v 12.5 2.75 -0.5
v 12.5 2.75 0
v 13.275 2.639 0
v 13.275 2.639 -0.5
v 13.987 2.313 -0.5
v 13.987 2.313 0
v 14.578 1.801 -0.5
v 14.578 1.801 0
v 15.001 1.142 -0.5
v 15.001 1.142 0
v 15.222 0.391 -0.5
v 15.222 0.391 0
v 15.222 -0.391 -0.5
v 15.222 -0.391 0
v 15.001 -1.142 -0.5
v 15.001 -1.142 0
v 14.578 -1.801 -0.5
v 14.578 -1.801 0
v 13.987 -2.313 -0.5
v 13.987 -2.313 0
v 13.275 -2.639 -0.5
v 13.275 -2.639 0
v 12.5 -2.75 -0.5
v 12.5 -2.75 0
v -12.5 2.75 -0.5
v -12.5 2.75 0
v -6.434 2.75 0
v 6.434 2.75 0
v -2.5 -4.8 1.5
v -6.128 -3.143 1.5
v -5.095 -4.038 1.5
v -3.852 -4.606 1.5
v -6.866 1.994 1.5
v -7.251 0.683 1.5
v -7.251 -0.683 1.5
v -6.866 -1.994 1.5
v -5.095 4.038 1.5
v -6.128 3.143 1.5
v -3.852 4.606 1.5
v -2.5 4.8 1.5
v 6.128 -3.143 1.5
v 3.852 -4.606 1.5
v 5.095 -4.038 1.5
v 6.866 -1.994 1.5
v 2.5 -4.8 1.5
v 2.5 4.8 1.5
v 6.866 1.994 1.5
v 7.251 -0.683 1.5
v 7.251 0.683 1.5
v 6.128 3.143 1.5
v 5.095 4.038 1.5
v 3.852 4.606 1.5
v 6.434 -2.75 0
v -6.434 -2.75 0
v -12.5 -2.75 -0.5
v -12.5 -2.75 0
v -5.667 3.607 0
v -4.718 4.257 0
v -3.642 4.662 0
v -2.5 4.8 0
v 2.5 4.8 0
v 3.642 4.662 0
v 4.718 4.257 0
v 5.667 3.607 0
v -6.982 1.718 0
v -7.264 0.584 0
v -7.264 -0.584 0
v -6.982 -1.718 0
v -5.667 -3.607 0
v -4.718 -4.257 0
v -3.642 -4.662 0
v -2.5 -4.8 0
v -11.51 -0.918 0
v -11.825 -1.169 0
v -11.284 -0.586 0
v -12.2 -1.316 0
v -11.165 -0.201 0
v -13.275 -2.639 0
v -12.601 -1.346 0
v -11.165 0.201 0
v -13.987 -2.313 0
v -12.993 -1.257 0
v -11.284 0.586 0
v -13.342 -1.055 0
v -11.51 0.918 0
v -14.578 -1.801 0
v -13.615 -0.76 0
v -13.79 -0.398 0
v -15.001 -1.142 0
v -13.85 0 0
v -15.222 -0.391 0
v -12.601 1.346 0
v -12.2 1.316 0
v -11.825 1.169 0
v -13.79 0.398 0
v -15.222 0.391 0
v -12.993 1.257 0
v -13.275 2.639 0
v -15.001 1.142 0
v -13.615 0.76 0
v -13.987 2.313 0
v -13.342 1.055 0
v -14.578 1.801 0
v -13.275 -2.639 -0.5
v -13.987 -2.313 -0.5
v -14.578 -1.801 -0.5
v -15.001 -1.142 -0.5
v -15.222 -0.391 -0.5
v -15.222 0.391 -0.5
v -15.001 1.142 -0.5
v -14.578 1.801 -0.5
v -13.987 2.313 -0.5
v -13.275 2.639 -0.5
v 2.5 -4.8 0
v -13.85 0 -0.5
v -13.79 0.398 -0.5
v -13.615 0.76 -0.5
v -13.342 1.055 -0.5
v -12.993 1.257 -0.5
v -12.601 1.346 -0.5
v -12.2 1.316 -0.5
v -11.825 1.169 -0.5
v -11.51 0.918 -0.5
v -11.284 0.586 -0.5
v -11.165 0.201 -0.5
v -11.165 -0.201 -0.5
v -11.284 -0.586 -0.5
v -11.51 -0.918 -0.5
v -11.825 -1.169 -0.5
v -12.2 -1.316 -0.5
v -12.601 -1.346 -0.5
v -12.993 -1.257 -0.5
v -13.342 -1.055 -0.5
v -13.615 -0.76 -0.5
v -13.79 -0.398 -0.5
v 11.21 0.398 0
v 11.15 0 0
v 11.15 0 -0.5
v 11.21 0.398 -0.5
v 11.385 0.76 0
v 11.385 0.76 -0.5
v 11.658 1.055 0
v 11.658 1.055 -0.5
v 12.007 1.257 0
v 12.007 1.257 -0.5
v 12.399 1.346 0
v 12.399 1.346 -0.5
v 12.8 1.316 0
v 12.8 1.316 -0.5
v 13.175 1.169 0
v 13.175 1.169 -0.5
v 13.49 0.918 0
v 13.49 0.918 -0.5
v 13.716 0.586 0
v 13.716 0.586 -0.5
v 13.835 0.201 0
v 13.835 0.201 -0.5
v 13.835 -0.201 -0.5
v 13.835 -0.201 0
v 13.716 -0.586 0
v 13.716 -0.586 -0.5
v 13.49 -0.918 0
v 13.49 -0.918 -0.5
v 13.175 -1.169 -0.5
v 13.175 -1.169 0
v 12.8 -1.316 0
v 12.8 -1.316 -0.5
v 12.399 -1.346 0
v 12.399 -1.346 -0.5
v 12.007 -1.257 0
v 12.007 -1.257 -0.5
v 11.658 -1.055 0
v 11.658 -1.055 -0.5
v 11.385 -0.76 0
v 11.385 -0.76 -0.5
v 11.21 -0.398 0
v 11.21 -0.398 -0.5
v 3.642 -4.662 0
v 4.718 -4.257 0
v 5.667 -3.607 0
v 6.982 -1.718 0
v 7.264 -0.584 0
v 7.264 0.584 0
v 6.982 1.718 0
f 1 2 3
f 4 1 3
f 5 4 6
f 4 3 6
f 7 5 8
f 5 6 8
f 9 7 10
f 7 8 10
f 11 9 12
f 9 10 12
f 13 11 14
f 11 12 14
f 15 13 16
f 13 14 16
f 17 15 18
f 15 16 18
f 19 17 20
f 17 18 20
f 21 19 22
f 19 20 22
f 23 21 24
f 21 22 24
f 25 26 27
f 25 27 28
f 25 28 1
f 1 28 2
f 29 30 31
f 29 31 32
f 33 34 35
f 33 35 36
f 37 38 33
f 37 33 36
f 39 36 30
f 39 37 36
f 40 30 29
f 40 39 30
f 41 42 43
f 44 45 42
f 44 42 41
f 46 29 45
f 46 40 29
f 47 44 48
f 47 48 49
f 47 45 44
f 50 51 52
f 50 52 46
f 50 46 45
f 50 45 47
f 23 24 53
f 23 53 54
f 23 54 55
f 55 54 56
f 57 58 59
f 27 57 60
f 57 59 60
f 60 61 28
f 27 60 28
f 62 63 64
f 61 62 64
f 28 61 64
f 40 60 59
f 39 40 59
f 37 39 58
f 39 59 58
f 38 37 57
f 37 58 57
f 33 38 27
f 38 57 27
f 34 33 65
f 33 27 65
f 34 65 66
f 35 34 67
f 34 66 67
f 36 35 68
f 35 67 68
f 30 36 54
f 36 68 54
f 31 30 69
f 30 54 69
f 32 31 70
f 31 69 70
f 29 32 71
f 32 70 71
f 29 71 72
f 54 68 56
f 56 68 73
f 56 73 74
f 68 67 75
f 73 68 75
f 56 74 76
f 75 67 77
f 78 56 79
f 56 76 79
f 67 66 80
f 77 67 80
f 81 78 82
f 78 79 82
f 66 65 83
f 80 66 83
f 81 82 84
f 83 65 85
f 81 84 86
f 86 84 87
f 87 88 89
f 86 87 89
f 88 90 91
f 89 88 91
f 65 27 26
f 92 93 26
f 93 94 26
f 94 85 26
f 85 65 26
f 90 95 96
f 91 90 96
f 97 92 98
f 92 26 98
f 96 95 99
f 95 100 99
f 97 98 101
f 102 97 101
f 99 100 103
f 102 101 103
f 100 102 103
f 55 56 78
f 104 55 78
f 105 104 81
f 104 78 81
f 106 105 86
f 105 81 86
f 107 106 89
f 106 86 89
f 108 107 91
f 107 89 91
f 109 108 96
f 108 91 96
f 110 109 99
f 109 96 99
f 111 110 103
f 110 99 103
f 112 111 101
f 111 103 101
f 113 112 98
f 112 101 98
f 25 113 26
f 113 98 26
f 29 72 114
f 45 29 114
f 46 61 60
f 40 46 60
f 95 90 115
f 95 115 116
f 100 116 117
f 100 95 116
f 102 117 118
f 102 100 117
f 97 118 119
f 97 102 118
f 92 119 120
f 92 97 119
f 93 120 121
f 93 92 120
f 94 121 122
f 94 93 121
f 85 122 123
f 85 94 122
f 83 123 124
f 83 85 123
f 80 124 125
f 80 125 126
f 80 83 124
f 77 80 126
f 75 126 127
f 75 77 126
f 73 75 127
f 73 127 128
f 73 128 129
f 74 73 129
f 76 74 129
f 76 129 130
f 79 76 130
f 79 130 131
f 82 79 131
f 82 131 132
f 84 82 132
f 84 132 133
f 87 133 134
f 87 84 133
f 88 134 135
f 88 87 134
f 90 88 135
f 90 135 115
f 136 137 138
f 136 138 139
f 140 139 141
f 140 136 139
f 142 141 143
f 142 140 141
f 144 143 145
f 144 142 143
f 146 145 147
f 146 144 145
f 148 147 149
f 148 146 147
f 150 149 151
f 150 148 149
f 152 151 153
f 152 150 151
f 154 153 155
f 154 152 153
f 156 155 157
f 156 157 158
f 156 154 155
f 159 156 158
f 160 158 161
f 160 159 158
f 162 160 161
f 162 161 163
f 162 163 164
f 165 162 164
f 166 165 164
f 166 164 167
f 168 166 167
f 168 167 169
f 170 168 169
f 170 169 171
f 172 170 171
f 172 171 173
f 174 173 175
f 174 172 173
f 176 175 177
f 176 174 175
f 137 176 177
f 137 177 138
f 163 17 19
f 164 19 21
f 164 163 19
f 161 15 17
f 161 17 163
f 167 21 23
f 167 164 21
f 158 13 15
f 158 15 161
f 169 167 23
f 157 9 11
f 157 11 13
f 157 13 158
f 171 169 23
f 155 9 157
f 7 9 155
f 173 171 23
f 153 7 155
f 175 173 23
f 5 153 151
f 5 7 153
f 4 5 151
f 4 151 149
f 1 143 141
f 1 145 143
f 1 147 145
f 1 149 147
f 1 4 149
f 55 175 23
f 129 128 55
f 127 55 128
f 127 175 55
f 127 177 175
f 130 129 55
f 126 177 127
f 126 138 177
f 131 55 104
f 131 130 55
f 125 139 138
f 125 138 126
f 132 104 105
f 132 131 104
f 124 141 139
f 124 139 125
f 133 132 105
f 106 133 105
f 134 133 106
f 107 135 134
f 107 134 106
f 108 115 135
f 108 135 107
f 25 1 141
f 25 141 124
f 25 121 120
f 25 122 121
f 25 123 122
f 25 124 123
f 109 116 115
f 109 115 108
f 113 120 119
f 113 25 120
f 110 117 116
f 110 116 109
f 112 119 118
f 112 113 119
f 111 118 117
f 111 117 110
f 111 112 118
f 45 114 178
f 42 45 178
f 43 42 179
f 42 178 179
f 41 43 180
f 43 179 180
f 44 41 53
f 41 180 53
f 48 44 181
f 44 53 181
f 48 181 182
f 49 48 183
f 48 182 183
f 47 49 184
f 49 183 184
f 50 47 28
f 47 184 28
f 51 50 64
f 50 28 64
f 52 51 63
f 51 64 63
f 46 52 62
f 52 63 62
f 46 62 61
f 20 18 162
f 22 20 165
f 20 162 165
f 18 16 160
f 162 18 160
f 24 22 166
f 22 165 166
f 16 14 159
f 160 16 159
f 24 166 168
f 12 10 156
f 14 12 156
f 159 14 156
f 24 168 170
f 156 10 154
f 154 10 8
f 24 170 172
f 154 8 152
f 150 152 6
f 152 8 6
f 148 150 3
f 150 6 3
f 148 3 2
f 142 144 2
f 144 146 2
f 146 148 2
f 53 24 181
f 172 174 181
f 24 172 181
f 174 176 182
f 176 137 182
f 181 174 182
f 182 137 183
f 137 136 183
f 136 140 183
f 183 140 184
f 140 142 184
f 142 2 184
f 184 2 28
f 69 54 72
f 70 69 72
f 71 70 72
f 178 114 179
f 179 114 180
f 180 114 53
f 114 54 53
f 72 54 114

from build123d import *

# Parameters (mm, degrees)
BOSS_EXTRUDE2_DEPTH = 1.5
SKETCH4_R           = 1.35
BOSS_EXTRUDE4_DEPTH = 0.5


with BuildPart() as part:
    # Sketch2 → Boss-Extrude2 (new body)
    with BuildSketch(Plane.XY):
        with BuildLine():
            Line((-2.5, -4.8), (2.5, -4.8))
            ThreePointArc((2.5, -4.8), (7.3, 0), (2.5, 4.8))
            Line((2.5, 4.8), (-2.5, 4.8))
            ThreePointArc((-2.5, 4.8), (-7.3, 0), (-2.5, -4.8))
        make_face()
    extrude(amount=BOSS_EXTRUDE2_DEPTH)

    # Sketch4 → Boss-Extrude4 (add)
    with BuildSketch(Plane(origin=(0, 0, 0), x_dir=(-1, 0, 0), z_dir=(0, 0, -1))):
        with BuildLine():
            Line((-12.5, -2.75), (12.5, -2.75))
            ThreePointArc((12.5, -2.75), (15.25, 0), (12.5, 2.75))
            Line((12.5, 2.75), (-12.5, 2.75))
            ThreePointArc((-12.5, 2.75), (-15.25, 0), (-12.5, -2.75))
        make_face()
        with Locations((-12.5, 0)):
            Circle(SKETCH4_R, mode=Mode.SUBTRACT)
        with Locations((12.5, 0)):
            Circle(SKETCH4_R, mode=Mode.SUBTRACT)
    extrude(amount=BOSS_EXTRUDE4_DEPTH)


solid = part.part
